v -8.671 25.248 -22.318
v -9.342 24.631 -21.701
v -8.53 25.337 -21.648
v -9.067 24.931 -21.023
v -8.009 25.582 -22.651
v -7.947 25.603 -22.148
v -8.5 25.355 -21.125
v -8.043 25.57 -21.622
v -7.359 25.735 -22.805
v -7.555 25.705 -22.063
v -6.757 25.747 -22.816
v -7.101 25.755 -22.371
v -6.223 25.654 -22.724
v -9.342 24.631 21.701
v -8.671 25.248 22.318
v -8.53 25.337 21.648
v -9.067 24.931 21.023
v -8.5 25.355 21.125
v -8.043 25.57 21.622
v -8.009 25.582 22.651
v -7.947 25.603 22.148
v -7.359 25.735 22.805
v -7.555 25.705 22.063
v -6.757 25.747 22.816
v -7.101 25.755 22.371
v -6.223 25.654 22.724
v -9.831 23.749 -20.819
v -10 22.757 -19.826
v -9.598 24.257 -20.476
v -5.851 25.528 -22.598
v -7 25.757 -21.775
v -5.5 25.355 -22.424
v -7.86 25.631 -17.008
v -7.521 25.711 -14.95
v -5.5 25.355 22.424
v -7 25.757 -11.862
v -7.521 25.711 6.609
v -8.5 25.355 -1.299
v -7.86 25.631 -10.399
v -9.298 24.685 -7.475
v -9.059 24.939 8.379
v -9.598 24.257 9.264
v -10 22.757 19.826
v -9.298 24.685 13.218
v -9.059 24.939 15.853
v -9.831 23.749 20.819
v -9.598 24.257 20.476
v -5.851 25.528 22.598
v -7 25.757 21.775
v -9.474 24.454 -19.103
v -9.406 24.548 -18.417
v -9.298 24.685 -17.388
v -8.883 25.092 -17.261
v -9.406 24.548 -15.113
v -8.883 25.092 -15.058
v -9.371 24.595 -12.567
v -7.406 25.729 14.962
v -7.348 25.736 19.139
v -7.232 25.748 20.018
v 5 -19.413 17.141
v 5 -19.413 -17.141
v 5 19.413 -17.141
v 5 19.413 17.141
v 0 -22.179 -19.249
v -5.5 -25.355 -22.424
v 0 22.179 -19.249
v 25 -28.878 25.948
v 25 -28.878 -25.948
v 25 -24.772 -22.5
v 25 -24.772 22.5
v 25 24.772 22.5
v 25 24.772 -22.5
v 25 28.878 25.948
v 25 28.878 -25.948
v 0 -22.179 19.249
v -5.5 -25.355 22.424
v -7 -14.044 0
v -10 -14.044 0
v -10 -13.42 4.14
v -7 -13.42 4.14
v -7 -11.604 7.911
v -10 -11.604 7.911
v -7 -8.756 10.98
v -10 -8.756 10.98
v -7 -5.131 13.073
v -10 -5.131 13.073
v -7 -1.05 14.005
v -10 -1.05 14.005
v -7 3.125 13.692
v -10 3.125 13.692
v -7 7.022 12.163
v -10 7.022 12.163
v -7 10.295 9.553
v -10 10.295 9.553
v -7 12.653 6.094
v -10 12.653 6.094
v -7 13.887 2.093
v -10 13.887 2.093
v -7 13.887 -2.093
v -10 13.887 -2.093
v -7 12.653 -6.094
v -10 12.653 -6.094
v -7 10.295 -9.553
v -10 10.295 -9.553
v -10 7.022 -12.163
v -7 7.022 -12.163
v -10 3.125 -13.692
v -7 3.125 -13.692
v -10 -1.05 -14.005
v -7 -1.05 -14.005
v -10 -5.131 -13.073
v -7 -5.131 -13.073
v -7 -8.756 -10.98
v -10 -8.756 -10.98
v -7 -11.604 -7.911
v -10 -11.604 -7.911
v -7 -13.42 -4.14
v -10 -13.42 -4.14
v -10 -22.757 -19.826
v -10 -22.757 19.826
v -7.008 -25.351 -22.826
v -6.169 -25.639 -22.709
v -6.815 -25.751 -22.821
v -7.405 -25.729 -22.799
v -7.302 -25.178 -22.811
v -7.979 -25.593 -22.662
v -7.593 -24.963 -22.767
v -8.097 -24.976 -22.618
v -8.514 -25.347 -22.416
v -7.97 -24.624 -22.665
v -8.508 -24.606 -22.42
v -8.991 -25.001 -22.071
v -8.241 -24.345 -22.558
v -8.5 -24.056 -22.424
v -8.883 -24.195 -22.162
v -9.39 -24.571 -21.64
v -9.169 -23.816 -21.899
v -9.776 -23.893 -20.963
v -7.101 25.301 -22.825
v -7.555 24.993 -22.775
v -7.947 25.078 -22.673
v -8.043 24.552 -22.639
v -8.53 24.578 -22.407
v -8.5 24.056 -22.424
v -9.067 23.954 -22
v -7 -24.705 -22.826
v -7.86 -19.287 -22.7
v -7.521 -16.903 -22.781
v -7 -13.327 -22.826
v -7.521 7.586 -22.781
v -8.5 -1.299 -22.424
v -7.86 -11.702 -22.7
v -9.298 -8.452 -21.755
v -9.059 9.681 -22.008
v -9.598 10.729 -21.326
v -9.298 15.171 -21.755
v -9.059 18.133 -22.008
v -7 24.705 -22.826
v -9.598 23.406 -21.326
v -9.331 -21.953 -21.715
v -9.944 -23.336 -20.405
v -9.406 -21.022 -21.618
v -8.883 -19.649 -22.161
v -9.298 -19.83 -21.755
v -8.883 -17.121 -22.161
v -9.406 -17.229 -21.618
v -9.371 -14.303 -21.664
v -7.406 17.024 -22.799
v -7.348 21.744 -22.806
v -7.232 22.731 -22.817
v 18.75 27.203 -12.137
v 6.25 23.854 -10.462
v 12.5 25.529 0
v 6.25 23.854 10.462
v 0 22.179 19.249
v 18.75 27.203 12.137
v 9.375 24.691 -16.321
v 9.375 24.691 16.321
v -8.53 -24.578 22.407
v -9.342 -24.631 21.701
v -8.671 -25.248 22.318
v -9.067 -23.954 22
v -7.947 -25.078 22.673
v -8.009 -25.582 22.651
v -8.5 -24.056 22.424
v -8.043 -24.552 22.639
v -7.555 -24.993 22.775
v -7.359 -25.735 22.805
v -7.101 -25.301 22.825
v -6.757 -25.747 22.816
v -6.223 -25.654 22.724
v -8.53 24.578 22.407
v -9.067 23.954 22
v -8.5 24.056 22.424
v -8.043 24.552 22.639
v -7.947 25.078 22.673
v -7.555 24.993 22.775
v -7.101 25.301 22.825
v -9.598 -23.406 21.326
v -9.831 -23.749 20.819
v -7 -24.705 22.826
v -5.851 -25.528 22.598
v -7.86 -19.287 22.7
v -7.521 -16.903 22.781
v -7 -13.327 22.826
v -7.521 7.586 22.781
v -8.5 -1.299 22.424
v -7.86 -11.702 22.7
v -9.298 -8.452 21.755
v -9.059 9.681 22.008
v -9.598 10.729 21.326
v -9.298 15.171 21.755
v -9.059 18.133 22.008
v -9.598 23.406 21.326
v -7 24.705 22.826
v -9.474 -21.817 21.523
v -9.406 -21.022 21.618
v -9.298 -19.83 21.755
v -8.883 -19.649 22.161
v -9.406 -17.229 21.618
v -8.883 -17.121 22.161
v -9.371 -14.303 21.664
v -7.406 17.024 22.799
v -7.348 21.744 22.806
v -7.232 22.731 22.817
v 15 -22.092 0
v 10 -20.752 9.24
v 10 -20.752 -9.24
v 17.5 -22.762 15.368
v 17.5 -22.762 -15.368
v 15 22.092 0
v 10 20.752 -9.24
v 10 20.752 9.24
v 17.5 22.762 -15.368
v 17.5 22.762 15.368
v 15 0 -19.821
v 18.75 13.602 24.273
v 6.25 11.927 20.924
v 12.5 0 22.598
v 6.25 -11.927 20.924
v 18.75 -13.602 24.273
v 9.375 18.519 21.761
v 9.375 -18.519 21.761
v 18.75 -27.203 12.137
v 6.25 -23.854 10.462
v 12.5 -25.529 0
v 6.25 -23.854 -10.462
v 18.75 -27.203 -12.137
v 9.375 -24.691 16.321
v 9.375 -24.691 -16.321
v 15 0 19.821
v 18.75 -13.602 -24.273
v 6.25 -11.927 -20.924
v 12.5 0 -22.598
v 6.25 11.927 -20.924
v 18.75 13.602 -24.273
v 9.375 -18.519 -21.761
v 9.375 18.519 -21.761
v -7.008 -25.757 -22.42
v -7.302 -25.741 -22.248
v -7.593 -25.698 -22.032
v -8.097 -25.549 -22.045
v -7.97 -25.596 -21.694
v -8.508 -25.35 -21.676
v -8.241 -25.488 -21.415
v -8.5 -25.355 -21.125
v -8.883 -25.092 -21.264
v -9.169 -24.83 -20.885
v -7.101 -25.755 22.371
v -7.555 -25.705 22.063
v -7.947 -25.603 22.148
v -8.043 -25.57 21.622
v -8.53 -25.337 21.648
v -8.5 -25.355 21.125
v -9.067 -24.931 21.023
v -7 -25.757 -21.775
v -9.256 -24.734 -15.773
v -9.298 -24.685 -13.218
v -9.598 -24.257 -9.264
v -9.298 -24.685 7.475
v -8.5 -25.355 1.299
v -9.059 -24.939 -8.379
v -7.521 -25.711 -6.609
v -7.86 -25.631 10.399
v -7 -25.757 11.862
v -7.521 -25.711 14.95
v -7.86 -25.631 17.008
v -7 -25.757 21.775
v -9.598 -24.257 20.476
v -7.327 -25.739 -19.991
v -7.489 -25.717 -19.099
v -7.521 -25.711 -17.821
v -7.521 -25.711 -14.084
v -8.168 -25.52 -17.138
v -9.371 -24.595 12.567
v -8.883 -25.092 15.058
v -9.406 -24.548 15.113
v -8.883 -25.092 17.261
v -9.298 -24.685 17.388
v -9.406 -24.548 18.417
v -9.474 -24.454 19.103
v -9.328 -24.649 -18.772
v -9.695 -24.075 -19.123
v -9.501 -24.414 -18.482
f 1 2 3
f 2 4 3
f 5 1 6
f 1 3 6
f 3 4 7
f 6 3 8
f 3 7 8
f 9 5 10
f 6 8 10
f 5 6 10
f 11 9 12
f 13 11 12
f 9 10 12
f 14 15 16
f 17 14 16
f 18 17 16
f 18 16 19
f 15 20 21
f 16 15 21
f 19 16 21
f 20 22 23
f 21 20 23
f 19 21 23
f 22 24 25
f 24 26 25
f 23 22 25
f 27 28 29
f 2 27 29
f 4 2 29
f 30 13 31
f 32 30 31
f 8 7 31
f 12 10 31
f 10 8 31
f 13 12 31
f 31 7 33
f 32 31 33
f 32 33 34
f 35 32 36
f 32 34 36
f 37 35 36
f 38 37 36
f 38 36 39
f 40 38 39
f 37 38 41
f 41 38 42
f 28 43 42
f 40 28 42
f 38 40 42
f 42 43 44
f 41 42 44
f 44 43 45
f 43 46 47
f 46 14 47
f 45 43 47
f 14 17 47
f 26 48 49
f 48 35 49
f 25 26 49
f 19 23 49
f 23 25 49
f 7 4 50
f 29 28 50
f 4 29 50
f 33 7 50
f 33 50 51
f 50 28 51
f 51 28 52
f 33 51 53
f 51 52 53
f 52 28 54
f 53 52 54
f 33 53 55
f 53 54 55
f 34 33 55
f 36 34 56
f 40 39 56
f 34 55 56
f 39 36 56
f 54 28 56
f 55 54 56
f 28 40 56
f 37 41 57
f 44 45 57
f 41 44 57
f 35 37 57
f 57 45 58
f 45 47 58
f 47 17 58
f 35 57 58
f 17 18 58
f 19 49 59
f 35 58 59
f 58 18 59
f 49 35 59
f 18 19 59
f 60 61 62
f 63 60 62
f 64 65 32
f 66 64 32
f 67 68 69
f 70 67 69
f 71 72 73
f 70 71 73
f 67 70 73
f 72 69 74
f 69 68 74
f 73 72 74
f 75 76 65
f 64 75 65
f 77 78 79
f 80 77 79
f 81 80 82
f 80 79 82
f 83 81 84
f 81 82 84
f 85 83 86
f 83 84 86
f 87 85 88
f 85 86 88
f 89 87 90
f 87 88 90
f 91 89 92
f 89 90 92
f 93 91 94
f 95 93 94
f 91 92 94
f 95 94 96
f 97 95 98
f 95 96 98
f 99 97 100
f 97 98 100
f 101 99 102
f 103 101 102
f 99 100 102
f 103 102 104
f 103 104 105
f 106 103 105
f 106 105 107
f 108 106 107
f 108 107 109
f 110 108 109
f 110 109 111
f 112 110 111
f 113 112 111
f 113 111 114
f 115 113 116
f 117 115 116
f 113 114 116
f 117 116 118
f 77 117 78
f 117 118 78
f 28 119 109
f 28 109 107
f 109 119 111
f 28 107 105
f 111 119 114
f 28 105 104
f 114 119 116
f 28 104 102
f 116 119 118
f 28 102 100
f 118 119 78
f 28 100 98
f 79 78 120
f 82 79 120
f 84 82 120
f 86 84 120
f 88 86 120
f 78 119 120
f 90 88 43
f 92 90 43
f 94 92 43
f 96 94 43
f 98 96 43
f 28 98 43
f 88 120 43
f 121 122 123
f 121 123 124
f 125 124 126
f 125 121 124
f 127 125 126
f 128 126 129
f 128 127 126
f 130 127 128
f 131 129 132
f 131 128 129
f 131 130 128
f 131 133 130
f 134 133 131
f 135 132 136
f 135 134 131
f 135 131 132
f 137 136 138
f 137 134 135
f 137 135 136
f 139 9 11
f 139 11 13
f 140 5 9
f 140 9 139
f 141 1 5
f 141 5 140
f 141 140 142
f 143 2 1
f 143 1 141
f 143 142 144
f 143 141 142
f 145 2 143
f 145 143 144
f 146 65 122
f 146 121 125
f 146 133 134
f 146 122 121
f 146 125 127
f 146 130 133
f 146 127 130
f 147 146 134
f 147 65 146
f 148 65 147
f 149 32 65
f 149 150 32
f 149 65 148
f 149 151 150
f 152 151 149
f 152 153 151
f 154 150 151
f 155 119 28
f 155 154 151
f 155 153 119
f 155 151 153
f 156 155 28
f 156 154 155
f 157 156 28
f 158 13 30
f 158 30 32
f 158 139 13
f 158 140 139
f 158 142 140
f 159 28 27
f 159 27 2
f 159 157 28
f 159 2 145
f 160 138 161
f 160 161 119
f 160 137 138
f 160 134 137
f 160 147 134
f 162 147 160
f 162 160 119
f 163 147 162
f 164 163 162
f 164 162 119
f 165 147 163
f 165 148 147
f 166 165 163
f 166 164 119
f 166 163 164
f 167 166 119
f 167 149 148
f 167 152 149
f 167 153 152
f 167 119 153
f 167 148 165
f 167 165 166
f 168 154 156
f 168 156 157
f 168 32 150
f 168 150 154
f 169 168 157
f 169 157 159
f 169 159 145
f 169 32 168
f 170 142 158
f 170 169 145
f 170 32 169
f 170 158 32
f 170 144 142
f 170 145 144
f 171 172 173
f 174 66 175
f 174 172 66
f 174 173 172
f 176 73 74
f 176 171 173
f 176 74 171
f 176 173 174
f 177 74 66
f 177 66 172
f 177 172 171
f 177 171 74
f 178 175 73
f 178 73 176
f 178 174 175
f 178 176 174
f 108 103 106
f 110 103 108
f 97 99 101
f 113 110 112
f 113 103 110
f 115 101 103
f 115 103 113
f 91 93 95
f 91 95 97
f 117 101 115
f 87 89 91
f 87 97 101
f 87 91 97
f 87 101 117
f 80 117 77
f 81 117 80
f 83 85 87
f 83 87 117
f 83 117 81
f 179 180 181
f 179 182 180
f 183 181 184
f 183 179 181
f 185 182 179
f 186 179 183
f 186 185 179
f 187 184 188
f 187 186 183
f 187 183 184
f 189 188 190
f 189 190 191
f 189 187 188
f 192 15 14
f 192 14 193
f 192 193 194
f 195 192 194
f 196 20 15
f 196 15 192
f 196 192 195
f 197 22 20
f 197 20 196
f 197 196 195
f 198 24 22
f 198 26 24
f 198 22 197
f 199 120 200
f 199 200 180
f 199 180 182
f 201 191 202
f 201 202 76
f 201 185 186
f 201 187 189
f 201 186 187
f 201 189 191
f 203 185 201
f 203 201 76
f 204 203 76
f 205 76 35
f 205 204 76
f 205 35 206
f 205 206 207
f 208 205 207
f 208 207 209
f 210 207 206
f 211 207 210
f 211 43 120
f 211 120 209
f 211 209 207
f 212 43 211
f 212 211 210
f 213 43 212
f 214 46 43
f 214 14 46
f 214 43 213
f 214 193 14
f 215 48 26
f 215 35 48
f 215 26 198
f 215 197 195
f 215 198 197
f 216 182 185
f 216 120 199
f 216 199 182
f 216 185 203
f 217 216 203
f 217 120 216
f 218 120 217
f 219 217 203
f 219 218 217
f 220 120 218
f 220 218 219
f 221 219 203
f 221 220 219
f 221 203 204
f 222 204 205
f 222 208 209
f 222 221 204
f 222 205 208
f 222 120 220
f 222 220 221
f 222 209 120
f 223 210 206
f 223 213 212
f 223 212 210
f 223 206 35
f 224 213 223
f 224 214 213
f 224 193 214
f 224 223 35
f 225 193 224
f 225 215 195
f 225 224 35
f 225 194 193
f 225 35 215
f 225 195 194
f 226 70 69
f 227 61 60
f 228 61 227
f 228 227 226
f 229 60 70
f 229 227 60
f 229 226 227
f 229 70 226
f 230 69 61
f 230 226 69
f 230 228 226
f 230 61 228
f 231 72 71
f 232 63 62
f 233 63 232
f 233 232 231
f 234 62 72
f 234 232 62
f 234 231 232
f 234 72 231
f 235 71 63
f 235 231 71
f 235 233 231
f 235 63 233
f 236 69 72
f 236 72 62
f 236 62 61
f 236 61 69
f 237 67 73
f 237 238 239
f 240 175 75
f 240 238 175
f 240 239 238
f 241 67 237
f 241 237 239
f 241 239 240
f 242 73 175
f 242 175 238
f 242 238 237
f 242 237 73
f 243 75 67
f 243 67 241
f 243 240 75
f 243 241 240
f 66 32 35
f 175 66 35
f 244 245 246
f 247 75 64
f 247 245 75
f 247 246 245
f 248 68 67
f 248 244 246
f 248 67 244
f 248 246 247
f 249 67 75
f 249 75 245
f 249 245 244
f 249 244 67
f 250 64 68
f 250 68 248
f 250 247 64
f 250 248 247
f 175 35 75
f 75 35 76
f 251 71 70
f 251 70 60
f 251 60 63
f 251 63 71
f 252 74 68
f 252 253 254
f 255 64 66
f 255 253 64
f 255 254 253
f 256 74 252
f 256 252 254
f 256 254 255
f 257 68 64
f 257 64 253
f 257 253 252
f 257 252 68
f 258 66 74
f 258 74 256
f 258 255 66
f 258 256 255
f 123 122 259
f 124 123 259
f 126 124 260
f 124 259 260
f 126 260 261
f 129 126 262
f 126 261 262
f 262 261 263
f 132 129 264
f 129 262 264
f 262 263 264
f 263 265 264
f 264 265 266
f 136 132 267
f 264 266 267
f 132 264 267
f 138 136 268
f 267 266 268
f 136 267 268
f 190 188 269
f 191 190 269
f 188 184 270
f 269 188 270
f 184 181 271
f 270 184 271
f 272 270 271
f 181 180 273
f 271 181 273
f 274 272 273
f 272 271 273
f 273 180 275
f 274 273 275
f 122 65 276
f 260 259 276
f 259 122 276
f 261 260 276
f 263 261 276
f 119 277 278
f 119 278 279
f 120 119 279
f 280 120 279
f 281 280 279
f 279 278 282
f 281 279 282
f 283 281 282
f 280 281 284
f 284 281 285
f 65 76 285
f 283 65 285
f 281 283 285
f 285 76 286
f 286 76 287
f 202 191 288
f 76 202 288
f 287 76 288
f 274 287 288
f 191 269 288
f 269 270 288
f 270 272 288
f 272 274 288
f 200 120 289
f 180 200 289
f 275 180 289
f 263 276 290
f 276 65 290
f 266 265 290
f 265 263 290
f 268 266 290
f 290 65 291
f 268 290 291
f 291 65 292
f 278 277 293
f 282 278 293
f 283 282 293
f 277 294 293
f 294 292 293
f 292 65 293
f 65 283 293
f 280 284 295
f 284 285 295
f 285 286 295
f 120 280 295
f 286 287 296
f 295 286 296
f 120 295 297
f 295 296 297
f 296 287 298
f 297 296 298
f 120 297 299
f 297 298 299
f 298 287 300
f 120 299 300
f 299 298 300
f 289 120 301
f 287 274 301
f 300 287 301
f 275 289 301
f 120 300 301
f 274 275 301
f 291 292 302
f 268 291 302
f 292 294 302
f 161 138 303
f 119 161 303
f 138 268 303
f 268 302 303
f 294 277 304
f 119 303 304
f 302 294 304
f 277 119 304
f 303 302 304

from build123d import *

# Parameters (mm, degrees)
F0_W          = 44.3588159978
F0_H          = 38.4979620576
F1_DEPTH      = 25
F1_TAPER      = -15
F1_DEPTH_BACK = 10
F1_TAPER_BACK = -30
F2_W          = 49.5432667505
F2_H          = 45
F3_DEPTH      = 20
F3_TAPER      = 15
F4_R          = 3
F5_R          = 14.044270733
F6_DEPTH      = 3


with BuildPart() as f1:
    # F0 (on Right) → F1 (new body, two sides)
    with BuildSketch(Plane.YZ) as f1_sk:
        Rectangle(F0_W, F0_H)
    extrude(amount=F1_DEPTH, taper=F1_TAPER)
    extrude(f1_sk.sketch, amount=-F1_DEPTH_BACK, taper=F1_TAPER_BACK)

    # F2 (on face) → F3 (cut)
    with BuildSketch(Plane.YZ.offset(25)):
        Rectangle(F2_W, F2_H)
    extrude(amount=-F3_DEPTH, taper=F3_TAPER, mode=Mode.SUBTRACT)

    # F4
    f4_edges = [f1.edges().sort_by_distance(p)[0] for p in [
        (-10, 27.952911, 0),
        (-10, 0, 25.022484),
        (-10, -27.952911, 0),
        (-10, 0, -25.022484),
    ]]
    fillet(f4_edges, radius=F4_R)

    # F5 (on face) → F6 (cut)
    with BuildSketch(Plane(origin=(-10, 0, 0), x_dir=(0, -1, 0), z_dir=(-1, 0, 0))):
        Circle(F5_R)
    extrude(amount=-F6_DEPTH, mode=Mode.SUBTRACT)


solid = f1.part
